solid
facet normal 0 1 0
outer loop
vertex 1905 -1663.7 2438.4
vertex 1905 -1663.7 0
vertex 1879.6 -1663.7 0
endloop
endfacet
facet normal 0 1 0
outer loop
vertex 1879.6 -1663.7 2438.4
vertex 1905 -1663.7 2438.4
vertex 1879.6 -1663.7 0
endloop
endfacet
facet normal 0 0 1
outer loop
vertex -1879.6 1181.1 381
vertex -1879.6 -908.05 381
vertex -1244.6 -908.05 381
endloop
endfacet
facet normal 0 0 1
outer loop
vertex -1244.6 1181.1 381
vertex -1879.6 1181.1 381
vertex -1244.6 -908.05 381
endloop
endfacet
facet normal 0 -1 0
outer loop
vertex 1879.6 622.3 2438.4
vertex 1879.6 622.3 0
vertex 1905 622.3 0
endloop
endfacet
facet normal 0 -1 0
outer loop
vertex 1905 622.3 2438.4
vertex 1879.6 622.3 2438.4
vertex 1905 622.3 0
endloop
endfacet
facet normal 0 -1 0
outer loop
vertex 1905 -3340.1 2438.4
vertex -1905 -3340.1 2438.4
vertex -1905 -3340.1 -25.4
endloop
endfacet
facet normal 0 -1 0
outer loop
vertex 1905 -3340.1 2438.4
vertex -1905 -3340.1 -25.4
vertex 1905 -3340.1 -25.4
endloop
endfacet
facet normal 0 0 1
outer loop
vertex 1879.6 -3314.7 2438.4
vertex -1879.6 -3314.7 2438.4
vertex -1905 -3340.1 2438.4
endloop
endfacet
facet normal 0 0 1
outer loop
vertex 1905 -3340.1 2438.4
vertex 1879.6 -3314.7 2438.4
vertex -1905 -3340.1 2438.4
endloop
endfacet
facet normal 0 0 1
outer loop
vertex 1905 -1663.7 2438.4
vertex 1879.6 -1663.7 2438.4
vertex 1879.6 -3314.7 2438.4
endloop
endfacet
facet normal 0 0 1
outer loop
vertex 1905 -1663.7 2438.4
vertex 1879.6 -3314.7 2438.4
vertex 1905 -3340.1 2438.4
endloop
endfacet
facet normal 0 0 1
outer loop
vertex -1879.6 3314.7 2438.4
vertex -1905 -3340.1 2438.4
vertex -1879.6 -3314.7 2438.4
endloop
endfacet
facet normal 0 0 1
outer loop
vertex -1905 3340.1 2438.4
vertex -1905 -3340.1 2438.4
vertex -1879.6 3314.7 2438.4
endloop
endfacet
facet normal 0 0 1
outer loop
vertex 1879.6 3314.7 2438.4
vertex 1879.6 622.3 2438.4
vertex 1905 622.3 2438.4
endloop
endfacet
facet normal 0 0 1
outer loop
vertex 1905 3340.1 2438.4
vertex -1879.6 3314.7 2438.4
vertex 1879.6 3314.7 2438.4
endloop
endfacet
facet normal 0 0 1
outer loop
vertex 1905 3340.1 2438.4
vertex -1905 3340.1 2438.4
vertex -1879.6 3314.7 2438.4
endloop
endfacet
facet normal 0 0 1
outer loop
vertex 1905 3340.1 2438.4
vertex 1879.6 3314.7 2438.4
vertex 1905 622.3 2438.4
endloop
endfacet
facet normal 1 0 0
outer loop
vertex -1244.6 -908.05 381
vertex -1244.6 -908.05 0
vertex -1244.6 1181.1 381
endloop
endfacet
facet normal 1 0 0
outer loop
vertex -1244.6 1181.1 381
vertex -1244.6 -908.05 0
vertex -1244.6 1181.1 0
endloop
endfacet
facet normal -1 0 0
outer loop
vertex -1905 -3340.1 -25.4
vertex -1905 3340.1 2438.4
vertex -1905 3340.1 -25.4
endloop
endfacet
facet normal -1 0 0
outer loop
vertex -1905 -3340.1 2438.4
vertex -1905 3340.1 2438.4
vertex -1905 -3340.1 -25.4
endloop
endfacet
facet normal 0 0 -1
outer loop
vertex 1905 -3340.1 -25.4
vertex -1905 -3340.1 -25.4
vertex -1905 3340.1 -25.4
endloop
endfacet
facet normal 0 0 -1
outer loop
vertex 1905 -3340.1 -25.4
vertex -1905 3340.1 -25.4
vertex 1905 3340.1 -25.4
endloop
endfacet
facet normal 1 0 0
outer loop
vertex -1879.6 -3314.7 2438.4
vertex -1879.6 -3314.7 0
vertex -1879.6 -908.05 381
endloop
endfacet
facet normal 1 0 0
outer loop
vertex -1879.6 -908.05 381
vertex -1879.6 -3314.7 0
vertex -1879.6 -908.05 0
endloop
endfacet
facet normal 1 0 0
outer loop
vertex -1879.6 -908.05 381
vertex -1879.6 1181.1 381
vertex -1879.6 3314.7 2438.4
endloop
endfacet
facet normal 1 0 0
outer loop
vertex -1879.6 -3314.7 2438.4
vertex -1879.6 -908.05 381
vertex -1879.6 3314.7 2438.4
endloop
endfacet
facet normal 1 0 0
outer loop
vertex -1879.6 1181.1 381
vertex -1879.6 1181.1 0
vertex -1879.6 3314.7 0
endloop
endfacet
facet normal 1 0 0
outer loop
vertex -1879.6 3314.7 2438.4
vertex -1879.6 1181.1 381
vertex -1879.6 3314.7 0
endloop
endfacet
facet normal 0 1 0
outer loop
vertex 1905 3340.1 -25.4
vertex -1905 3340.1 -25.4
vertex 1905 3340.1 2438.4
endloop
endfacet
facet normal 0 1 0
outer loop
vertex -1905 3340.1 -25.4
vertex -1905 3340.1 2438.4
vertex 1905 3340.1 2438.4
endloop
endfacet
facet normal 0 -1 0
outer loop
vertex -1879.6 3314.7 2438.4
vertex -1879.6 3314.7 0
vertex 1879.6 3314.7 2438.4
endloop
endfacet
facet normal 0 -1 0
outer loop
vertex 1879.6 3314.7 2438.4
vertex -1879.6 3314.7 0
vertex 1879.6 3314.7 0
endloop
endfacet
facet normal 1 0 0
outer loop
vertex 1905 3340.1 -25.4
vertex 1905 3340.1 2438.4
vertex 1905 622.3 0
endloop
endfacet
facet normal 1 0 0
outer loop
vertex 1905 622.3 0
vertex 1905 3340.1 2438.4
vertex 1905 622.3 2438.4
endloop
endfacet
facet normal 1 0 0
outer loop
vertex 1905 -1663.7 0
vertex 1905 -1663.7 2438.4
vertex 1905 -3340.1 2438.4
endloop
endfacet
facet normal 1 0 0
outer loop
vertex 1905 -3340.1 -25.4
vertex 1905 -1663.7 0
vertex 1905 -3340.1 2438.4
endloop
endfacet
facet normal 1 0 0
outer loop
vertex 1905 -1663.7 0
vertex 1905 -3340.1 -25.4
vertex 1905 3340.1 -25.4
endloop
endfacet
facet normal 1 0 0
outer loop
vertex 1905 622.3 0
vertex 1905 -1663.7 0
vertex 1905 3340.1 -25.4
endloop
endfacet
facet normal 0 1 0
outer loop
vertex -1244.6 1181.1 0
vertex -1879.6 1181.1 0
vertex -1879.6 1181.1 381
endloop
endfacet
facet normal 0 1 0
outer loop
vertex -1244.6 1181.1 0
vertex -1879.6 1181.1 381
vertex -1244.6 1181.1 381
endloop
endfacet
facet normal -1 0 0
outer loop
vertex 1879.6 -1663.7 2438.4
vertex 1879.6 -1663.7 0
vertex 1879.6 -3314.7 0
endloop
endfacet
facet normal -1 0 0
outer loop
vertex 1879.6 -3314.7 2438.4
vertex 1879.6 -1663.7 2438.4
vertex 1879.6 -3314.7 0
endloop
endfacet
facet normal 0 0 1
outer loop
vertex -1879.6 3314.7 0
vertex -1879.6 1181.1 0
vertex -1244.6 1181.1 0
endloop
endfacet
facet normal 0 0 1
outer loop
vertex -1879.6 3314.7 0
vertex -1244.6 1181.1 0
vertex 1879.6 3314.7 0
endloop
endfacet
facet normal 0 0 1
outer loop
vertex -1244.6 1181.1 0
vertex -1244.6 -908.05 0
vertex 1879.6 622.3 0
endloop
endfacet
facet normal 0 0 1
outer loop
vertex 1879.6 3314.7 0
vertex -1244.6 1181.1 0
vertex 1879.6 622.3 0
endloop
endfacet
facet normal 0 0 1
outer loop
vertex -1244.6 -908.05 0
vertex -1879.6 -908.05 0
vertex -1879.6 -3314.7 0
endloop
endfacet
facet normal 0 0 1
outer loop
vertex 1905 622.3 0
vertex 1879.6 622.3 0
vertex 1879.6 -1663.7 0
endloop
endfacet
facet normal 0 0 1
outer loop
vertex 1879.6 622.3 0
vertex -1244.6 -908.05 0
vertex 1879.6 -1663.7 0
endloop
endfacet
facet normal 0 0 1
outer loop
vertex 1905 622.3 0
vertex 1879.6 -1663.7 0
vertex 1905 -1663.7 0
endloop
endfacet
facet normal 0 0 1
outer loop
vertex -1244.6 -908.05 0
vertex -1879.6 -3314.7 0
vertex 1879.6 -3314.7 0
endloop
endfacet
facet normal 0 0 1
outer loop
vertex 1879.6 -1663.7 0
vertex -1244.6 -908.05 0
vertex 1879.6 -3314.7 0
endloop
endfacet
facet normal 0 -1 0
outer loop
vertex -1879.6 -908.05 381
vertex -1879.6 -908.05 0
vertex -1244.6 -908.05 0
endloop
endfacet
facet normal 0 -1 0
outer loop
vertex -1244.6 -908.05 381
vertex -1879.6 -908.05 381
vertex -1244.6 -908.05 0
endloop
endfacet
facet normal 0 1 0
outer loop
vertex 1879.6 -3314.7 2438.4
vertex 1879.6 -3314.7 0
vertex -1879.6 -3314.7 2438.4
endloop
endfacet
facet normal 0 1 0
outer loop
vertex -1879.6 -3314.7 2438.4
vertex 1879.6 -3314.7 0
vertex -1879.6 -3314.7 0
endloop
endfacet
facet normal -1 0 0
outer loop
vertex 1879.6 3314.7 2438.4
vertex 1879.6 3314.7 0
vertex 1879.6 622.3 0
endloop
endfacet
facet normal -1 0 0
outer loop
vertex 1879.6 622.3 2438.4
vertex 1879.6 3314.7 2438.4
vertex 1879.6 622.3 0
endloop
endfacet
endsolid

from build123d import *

# Parameters (mm, degrees)
F1_DEPTH = 2438.4
F2_W     = 3810
F2_H     = 6680.2
F3_DEPTH = 25.4
F4_W     = 635
F4_H     = 2089.15
F5_DEPTH = 381


with BuildPart() as f1:
    # F0 (on Top) → F1 (new body)
    with BuildSketch(Plane.XY):
        Polygon((1905, 3340.1), (-1905, 3340.1), (-1905, -3340.1), (1905, -3340.1), (1905, -1663.7), (1879.6, -1663.7), (1879.6, -3314.7), (-1879.6, -3314.7), (-1879.6, 3314.7), (1879.6, 3314.7), (1879.6, 622.3), (1905, 622.3), align=None)
    extrude(amount=F1_DEPTH)

    # F2 (on face) → F3 (join)
    with BuildSketch(Plane(origin=(0, 0, 0), x_dir=(1, 0, 0), z_dir=(0, 0, -1))):
        Rectangle(F2_W, F2_H)
    extrude(amount=F3_DEPTH)

    # F4 (on face) → F5 (join)
    with BuildSketch(Plane.XY):
        with Locations((-1562.1, 136.525)):
            Rectangle(F4_W, F4_H)
    extrude(amount=F5_DEPTH)


solid = f1.part
